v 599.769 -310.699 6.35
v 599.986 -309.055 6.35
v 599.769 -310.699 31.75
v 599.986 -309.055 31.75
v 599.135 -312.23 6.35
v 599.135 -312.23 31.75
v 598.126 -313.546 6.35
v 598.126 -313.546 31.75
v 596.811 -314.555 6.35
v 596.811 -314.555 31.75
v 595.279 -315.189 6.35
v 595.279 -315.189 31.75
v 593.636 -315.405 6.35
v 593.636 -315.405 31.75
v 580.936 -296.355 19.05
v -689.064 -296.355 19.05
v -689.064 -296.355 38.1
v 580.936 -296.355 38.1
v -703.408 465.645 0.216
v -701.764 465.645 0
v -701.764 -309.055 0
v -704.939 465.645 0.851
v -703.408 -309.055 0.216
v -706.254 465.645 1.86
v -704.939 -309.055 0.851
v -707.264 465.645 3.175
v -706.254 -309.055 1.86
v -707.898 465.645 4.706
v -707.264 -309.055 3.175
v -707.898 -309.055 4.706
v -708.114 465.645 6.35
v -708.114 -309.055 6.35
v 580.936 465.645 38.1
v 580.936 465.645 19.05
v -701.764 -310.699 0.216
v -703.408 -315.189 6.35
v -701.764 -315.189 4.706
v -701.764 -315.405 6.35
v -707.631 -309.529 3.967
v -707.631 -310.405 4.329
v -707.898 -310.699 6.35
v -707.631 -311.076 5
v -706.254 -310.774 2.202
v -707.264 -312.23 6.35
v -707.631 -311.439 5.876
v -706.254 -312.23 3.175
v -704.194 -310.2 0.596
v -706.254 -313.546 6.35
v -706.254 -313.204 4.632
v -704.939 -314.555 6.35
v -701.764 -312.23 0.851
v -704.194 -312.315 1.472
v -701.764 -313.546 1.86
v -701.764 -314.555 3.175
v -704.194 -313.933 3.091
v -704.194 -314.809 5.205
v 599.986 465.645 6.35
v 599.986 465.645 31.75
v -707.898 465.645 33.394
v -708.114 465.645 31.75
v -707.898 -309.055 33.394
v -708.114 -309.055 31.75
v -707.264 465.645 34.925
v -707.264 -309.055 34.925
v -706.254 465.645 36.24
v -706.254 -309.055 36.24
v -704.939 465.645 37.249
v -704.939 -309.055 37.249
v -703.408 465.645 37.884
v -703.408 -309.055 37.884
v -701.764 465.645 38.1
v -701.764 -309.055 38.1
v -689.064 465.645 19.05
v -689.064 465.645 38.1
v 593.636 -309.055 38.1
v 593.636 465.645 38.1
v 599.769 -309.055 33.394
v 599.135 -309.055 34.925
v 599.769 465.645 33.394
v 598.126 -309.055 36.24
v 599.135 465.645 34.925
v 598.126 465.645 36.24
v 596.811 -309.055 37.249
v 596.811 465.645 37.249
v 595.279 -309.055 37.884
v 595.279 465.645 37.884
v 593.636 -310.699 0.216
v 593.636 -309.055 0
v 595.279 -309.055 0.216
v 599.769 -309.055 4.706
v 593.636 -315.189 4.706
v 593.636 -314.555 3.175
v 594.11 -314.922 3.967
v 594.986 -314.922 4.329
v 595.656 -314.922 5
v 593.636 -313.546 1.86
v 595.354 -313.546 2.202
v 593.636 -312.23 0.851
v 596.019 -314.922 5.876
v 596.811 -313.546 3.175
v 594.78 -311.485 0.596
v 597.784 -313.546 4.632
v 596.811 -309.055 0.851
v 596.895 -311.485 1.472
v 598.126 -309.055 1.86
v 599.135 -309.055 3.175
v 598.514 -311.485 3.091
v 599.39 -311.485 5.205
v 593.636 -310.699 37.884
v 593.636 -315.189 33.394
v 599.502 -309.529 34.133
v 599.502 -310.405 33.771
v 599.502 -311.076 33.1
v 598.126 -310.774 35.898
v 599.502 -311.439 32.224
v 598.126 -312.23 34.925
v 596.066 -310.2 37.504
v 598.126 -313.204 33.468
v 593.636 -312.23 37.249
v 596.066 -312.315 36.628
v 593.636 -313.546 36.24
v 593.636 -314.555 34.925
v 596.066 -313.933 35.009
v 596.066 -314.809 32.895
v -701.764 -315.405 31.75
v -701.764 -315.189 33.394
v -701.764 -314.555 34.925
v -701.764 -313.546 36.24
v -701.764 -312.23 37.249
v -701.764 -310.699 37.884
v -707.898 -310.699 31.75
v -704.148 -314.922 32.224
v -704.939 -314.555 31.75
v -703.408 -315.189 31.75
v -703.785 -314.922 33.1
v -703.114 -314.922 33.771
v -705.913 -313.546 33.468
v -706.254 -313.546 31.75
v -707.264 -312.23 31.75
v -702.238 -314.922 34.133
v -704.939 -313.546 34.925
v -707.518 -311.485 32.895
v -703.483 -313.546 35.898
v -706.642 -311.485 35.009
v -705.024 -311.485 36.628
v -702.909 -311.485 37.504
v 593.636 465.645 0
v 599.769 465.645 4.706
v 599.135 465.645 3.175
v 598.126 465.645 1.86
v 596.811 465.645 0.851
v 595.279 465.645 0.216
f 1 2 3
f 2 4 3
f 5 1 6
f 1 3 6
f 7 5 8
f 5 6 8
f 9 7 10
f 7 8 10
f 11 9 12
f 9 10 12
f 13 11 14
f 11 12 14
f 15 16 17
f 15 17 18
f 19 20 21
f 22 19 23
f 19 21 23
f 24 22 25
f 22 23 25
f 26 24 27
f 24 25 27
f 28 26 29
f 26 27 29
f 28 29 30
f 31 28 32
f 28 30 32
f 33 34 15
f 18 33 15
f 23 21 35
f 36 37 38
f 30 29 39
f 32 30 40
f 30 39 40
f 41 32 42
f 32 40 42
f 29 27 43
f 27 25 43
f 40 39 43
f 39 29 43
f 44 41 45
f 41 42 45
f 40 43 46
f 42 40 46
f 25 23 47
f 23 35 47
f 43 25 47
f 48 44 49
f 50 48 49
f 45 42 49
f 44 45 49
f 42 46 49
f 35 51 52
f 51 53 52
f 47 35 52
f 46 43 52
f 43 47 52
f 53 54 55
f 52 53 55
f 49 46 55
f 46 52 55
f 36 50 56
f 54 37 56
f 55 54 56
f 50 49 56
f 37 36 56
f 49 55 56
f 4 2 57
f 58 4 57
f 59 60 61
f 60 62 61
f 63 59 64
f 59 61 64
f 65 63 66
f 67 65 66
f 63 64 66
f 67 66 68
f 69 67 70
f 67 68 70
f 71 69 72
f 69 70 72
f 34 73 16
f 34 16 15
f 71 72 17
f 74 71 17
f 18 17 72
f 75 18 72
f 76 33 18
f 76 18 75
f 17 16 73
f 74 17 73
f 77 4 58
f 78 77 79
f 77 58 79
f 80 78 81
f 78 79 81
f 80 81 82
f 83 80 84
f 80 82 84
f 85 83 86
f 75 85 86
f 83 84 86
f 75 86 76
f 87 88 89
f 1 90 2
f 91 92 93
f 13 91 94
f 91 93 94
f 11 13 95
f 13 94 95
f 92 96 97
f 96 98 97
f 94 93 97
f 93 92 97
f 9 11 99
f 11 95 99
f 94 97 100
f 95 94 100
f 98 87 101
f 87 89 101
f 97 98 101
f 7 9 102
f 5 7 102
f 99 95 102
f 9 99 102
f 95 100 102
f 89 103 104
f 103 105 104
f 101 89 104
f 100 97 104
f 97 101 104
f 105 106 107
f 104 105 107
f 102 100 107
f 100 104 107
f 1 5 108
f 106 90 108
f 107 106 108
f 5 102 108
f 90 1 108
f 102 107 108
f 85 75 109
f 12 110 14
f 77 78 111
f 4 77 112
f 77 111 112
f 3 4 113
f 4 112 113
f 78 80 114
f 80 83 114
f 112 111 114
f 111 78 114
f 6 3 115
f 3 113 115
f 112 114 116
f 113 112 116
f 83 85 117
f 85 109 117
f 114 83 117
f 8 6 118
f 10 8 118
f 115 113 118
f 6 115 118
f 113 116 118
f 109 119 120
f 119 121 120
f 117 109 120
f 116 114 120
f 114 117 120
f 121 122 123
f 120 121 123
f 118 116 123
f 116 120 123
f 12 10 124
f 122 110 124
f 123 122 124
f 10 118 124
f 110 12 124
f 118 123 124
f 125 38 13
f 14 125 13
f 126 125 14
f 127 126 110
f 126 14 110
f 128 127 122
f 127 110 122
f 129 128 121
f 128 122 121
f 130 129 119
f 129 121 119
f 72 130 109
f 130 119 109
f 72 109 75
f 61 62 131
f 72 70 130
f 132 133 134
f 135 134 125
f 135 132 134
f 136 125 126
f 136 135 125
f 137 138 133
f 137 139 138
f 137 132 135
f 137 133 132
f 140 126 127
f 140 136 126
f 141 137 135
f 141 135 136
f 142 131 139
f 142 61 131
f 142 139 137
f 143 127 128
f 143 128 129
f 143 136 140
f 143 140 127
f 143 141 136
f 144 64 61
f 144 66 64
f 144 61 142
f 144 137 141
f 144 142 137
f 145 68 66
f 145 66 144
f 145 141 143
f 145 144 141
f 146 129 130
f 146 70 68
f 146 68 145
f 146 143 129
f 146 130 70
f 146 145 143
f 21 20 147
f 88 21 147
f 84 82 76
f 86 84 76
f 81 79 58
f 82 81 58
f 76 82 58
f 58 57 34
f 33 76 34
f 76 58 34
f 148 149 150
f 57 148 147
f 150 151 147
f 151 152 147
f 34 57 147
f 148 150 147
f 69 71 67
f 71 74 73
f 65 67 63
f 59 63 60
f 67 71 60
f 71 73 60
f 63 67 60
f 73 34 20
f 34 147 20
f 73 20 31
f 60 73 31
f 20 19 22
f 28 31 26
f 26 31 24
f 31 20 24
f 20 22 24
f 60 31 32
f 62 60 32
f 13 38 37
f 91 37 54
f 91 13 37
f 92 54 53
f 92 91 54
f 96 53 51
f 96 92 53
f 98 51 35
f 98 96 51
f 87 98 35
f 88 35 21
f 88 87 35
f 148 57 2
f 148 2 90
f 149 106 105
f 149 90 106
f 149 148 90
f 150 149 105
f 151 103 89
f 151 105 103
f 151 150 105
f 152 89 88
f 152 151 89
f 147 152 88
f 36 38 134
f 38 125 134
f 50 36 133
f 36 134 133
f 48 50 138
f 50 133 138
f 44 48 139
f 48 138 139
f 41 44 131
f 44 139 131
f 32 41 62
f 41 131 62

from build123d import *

# Parameters (mm, degrees)
F0_W     = 1270
F0_H     = 762
F1_DEPTH = 19.05
F0_H_2   = 19.05
F2_DEPTH = 38.1
F3_R     = 6.35


with BuildPart() as f1:
    # F0 (on Top) → F1 (new body)
    with BuildSketch(Plane.XY):
        with Locations((-54.064326, 84.644601)):
            Rectangle(F0_W, F0_H)
    extrude(amount=F1_DEPTH)

    # F0 (on Top) → F2 (join)
    with BuildSketch(Plane.XY):
        Polygon((-689.064326, -296.355399), (-689.064326, 465.644601), (-708.114326, 465.644601), (-708.114326, -315.405399), (-689.064326, -315.405399), align=None)
        with Locations((-54.064326, -305.880399)):
            Rectangle(F0_W, F0_H_2)
        Polygon((599.985674, 465.644601), (580.935674, 465.644601), (580.935674, -296.355399), (580.935674, -315.405399), (599.985674, -315.405399), align=None)
    extrude(amount=F2_DEPTH)

    # F3
    f3_edges = [f1.edges().sort_by_distance(p)[0] for p in [
        (599.985674, 75.119601, 0),
        (-54.064326, -315.405399, 0),
        (-708.114326, 75.119601, 0),
        (-708.114326, 75.119601, 38.1),
        (-708.114326, -315.405399, 19.05),
        (-54.064326, -315.405399, 38.1),
        (599.985674, 75.119601, 38.1),
        (599.985674, -315.405399, 19.05),
    ]]
    fillet(f3_edges, radius=F3_R)


solid = f1.part
